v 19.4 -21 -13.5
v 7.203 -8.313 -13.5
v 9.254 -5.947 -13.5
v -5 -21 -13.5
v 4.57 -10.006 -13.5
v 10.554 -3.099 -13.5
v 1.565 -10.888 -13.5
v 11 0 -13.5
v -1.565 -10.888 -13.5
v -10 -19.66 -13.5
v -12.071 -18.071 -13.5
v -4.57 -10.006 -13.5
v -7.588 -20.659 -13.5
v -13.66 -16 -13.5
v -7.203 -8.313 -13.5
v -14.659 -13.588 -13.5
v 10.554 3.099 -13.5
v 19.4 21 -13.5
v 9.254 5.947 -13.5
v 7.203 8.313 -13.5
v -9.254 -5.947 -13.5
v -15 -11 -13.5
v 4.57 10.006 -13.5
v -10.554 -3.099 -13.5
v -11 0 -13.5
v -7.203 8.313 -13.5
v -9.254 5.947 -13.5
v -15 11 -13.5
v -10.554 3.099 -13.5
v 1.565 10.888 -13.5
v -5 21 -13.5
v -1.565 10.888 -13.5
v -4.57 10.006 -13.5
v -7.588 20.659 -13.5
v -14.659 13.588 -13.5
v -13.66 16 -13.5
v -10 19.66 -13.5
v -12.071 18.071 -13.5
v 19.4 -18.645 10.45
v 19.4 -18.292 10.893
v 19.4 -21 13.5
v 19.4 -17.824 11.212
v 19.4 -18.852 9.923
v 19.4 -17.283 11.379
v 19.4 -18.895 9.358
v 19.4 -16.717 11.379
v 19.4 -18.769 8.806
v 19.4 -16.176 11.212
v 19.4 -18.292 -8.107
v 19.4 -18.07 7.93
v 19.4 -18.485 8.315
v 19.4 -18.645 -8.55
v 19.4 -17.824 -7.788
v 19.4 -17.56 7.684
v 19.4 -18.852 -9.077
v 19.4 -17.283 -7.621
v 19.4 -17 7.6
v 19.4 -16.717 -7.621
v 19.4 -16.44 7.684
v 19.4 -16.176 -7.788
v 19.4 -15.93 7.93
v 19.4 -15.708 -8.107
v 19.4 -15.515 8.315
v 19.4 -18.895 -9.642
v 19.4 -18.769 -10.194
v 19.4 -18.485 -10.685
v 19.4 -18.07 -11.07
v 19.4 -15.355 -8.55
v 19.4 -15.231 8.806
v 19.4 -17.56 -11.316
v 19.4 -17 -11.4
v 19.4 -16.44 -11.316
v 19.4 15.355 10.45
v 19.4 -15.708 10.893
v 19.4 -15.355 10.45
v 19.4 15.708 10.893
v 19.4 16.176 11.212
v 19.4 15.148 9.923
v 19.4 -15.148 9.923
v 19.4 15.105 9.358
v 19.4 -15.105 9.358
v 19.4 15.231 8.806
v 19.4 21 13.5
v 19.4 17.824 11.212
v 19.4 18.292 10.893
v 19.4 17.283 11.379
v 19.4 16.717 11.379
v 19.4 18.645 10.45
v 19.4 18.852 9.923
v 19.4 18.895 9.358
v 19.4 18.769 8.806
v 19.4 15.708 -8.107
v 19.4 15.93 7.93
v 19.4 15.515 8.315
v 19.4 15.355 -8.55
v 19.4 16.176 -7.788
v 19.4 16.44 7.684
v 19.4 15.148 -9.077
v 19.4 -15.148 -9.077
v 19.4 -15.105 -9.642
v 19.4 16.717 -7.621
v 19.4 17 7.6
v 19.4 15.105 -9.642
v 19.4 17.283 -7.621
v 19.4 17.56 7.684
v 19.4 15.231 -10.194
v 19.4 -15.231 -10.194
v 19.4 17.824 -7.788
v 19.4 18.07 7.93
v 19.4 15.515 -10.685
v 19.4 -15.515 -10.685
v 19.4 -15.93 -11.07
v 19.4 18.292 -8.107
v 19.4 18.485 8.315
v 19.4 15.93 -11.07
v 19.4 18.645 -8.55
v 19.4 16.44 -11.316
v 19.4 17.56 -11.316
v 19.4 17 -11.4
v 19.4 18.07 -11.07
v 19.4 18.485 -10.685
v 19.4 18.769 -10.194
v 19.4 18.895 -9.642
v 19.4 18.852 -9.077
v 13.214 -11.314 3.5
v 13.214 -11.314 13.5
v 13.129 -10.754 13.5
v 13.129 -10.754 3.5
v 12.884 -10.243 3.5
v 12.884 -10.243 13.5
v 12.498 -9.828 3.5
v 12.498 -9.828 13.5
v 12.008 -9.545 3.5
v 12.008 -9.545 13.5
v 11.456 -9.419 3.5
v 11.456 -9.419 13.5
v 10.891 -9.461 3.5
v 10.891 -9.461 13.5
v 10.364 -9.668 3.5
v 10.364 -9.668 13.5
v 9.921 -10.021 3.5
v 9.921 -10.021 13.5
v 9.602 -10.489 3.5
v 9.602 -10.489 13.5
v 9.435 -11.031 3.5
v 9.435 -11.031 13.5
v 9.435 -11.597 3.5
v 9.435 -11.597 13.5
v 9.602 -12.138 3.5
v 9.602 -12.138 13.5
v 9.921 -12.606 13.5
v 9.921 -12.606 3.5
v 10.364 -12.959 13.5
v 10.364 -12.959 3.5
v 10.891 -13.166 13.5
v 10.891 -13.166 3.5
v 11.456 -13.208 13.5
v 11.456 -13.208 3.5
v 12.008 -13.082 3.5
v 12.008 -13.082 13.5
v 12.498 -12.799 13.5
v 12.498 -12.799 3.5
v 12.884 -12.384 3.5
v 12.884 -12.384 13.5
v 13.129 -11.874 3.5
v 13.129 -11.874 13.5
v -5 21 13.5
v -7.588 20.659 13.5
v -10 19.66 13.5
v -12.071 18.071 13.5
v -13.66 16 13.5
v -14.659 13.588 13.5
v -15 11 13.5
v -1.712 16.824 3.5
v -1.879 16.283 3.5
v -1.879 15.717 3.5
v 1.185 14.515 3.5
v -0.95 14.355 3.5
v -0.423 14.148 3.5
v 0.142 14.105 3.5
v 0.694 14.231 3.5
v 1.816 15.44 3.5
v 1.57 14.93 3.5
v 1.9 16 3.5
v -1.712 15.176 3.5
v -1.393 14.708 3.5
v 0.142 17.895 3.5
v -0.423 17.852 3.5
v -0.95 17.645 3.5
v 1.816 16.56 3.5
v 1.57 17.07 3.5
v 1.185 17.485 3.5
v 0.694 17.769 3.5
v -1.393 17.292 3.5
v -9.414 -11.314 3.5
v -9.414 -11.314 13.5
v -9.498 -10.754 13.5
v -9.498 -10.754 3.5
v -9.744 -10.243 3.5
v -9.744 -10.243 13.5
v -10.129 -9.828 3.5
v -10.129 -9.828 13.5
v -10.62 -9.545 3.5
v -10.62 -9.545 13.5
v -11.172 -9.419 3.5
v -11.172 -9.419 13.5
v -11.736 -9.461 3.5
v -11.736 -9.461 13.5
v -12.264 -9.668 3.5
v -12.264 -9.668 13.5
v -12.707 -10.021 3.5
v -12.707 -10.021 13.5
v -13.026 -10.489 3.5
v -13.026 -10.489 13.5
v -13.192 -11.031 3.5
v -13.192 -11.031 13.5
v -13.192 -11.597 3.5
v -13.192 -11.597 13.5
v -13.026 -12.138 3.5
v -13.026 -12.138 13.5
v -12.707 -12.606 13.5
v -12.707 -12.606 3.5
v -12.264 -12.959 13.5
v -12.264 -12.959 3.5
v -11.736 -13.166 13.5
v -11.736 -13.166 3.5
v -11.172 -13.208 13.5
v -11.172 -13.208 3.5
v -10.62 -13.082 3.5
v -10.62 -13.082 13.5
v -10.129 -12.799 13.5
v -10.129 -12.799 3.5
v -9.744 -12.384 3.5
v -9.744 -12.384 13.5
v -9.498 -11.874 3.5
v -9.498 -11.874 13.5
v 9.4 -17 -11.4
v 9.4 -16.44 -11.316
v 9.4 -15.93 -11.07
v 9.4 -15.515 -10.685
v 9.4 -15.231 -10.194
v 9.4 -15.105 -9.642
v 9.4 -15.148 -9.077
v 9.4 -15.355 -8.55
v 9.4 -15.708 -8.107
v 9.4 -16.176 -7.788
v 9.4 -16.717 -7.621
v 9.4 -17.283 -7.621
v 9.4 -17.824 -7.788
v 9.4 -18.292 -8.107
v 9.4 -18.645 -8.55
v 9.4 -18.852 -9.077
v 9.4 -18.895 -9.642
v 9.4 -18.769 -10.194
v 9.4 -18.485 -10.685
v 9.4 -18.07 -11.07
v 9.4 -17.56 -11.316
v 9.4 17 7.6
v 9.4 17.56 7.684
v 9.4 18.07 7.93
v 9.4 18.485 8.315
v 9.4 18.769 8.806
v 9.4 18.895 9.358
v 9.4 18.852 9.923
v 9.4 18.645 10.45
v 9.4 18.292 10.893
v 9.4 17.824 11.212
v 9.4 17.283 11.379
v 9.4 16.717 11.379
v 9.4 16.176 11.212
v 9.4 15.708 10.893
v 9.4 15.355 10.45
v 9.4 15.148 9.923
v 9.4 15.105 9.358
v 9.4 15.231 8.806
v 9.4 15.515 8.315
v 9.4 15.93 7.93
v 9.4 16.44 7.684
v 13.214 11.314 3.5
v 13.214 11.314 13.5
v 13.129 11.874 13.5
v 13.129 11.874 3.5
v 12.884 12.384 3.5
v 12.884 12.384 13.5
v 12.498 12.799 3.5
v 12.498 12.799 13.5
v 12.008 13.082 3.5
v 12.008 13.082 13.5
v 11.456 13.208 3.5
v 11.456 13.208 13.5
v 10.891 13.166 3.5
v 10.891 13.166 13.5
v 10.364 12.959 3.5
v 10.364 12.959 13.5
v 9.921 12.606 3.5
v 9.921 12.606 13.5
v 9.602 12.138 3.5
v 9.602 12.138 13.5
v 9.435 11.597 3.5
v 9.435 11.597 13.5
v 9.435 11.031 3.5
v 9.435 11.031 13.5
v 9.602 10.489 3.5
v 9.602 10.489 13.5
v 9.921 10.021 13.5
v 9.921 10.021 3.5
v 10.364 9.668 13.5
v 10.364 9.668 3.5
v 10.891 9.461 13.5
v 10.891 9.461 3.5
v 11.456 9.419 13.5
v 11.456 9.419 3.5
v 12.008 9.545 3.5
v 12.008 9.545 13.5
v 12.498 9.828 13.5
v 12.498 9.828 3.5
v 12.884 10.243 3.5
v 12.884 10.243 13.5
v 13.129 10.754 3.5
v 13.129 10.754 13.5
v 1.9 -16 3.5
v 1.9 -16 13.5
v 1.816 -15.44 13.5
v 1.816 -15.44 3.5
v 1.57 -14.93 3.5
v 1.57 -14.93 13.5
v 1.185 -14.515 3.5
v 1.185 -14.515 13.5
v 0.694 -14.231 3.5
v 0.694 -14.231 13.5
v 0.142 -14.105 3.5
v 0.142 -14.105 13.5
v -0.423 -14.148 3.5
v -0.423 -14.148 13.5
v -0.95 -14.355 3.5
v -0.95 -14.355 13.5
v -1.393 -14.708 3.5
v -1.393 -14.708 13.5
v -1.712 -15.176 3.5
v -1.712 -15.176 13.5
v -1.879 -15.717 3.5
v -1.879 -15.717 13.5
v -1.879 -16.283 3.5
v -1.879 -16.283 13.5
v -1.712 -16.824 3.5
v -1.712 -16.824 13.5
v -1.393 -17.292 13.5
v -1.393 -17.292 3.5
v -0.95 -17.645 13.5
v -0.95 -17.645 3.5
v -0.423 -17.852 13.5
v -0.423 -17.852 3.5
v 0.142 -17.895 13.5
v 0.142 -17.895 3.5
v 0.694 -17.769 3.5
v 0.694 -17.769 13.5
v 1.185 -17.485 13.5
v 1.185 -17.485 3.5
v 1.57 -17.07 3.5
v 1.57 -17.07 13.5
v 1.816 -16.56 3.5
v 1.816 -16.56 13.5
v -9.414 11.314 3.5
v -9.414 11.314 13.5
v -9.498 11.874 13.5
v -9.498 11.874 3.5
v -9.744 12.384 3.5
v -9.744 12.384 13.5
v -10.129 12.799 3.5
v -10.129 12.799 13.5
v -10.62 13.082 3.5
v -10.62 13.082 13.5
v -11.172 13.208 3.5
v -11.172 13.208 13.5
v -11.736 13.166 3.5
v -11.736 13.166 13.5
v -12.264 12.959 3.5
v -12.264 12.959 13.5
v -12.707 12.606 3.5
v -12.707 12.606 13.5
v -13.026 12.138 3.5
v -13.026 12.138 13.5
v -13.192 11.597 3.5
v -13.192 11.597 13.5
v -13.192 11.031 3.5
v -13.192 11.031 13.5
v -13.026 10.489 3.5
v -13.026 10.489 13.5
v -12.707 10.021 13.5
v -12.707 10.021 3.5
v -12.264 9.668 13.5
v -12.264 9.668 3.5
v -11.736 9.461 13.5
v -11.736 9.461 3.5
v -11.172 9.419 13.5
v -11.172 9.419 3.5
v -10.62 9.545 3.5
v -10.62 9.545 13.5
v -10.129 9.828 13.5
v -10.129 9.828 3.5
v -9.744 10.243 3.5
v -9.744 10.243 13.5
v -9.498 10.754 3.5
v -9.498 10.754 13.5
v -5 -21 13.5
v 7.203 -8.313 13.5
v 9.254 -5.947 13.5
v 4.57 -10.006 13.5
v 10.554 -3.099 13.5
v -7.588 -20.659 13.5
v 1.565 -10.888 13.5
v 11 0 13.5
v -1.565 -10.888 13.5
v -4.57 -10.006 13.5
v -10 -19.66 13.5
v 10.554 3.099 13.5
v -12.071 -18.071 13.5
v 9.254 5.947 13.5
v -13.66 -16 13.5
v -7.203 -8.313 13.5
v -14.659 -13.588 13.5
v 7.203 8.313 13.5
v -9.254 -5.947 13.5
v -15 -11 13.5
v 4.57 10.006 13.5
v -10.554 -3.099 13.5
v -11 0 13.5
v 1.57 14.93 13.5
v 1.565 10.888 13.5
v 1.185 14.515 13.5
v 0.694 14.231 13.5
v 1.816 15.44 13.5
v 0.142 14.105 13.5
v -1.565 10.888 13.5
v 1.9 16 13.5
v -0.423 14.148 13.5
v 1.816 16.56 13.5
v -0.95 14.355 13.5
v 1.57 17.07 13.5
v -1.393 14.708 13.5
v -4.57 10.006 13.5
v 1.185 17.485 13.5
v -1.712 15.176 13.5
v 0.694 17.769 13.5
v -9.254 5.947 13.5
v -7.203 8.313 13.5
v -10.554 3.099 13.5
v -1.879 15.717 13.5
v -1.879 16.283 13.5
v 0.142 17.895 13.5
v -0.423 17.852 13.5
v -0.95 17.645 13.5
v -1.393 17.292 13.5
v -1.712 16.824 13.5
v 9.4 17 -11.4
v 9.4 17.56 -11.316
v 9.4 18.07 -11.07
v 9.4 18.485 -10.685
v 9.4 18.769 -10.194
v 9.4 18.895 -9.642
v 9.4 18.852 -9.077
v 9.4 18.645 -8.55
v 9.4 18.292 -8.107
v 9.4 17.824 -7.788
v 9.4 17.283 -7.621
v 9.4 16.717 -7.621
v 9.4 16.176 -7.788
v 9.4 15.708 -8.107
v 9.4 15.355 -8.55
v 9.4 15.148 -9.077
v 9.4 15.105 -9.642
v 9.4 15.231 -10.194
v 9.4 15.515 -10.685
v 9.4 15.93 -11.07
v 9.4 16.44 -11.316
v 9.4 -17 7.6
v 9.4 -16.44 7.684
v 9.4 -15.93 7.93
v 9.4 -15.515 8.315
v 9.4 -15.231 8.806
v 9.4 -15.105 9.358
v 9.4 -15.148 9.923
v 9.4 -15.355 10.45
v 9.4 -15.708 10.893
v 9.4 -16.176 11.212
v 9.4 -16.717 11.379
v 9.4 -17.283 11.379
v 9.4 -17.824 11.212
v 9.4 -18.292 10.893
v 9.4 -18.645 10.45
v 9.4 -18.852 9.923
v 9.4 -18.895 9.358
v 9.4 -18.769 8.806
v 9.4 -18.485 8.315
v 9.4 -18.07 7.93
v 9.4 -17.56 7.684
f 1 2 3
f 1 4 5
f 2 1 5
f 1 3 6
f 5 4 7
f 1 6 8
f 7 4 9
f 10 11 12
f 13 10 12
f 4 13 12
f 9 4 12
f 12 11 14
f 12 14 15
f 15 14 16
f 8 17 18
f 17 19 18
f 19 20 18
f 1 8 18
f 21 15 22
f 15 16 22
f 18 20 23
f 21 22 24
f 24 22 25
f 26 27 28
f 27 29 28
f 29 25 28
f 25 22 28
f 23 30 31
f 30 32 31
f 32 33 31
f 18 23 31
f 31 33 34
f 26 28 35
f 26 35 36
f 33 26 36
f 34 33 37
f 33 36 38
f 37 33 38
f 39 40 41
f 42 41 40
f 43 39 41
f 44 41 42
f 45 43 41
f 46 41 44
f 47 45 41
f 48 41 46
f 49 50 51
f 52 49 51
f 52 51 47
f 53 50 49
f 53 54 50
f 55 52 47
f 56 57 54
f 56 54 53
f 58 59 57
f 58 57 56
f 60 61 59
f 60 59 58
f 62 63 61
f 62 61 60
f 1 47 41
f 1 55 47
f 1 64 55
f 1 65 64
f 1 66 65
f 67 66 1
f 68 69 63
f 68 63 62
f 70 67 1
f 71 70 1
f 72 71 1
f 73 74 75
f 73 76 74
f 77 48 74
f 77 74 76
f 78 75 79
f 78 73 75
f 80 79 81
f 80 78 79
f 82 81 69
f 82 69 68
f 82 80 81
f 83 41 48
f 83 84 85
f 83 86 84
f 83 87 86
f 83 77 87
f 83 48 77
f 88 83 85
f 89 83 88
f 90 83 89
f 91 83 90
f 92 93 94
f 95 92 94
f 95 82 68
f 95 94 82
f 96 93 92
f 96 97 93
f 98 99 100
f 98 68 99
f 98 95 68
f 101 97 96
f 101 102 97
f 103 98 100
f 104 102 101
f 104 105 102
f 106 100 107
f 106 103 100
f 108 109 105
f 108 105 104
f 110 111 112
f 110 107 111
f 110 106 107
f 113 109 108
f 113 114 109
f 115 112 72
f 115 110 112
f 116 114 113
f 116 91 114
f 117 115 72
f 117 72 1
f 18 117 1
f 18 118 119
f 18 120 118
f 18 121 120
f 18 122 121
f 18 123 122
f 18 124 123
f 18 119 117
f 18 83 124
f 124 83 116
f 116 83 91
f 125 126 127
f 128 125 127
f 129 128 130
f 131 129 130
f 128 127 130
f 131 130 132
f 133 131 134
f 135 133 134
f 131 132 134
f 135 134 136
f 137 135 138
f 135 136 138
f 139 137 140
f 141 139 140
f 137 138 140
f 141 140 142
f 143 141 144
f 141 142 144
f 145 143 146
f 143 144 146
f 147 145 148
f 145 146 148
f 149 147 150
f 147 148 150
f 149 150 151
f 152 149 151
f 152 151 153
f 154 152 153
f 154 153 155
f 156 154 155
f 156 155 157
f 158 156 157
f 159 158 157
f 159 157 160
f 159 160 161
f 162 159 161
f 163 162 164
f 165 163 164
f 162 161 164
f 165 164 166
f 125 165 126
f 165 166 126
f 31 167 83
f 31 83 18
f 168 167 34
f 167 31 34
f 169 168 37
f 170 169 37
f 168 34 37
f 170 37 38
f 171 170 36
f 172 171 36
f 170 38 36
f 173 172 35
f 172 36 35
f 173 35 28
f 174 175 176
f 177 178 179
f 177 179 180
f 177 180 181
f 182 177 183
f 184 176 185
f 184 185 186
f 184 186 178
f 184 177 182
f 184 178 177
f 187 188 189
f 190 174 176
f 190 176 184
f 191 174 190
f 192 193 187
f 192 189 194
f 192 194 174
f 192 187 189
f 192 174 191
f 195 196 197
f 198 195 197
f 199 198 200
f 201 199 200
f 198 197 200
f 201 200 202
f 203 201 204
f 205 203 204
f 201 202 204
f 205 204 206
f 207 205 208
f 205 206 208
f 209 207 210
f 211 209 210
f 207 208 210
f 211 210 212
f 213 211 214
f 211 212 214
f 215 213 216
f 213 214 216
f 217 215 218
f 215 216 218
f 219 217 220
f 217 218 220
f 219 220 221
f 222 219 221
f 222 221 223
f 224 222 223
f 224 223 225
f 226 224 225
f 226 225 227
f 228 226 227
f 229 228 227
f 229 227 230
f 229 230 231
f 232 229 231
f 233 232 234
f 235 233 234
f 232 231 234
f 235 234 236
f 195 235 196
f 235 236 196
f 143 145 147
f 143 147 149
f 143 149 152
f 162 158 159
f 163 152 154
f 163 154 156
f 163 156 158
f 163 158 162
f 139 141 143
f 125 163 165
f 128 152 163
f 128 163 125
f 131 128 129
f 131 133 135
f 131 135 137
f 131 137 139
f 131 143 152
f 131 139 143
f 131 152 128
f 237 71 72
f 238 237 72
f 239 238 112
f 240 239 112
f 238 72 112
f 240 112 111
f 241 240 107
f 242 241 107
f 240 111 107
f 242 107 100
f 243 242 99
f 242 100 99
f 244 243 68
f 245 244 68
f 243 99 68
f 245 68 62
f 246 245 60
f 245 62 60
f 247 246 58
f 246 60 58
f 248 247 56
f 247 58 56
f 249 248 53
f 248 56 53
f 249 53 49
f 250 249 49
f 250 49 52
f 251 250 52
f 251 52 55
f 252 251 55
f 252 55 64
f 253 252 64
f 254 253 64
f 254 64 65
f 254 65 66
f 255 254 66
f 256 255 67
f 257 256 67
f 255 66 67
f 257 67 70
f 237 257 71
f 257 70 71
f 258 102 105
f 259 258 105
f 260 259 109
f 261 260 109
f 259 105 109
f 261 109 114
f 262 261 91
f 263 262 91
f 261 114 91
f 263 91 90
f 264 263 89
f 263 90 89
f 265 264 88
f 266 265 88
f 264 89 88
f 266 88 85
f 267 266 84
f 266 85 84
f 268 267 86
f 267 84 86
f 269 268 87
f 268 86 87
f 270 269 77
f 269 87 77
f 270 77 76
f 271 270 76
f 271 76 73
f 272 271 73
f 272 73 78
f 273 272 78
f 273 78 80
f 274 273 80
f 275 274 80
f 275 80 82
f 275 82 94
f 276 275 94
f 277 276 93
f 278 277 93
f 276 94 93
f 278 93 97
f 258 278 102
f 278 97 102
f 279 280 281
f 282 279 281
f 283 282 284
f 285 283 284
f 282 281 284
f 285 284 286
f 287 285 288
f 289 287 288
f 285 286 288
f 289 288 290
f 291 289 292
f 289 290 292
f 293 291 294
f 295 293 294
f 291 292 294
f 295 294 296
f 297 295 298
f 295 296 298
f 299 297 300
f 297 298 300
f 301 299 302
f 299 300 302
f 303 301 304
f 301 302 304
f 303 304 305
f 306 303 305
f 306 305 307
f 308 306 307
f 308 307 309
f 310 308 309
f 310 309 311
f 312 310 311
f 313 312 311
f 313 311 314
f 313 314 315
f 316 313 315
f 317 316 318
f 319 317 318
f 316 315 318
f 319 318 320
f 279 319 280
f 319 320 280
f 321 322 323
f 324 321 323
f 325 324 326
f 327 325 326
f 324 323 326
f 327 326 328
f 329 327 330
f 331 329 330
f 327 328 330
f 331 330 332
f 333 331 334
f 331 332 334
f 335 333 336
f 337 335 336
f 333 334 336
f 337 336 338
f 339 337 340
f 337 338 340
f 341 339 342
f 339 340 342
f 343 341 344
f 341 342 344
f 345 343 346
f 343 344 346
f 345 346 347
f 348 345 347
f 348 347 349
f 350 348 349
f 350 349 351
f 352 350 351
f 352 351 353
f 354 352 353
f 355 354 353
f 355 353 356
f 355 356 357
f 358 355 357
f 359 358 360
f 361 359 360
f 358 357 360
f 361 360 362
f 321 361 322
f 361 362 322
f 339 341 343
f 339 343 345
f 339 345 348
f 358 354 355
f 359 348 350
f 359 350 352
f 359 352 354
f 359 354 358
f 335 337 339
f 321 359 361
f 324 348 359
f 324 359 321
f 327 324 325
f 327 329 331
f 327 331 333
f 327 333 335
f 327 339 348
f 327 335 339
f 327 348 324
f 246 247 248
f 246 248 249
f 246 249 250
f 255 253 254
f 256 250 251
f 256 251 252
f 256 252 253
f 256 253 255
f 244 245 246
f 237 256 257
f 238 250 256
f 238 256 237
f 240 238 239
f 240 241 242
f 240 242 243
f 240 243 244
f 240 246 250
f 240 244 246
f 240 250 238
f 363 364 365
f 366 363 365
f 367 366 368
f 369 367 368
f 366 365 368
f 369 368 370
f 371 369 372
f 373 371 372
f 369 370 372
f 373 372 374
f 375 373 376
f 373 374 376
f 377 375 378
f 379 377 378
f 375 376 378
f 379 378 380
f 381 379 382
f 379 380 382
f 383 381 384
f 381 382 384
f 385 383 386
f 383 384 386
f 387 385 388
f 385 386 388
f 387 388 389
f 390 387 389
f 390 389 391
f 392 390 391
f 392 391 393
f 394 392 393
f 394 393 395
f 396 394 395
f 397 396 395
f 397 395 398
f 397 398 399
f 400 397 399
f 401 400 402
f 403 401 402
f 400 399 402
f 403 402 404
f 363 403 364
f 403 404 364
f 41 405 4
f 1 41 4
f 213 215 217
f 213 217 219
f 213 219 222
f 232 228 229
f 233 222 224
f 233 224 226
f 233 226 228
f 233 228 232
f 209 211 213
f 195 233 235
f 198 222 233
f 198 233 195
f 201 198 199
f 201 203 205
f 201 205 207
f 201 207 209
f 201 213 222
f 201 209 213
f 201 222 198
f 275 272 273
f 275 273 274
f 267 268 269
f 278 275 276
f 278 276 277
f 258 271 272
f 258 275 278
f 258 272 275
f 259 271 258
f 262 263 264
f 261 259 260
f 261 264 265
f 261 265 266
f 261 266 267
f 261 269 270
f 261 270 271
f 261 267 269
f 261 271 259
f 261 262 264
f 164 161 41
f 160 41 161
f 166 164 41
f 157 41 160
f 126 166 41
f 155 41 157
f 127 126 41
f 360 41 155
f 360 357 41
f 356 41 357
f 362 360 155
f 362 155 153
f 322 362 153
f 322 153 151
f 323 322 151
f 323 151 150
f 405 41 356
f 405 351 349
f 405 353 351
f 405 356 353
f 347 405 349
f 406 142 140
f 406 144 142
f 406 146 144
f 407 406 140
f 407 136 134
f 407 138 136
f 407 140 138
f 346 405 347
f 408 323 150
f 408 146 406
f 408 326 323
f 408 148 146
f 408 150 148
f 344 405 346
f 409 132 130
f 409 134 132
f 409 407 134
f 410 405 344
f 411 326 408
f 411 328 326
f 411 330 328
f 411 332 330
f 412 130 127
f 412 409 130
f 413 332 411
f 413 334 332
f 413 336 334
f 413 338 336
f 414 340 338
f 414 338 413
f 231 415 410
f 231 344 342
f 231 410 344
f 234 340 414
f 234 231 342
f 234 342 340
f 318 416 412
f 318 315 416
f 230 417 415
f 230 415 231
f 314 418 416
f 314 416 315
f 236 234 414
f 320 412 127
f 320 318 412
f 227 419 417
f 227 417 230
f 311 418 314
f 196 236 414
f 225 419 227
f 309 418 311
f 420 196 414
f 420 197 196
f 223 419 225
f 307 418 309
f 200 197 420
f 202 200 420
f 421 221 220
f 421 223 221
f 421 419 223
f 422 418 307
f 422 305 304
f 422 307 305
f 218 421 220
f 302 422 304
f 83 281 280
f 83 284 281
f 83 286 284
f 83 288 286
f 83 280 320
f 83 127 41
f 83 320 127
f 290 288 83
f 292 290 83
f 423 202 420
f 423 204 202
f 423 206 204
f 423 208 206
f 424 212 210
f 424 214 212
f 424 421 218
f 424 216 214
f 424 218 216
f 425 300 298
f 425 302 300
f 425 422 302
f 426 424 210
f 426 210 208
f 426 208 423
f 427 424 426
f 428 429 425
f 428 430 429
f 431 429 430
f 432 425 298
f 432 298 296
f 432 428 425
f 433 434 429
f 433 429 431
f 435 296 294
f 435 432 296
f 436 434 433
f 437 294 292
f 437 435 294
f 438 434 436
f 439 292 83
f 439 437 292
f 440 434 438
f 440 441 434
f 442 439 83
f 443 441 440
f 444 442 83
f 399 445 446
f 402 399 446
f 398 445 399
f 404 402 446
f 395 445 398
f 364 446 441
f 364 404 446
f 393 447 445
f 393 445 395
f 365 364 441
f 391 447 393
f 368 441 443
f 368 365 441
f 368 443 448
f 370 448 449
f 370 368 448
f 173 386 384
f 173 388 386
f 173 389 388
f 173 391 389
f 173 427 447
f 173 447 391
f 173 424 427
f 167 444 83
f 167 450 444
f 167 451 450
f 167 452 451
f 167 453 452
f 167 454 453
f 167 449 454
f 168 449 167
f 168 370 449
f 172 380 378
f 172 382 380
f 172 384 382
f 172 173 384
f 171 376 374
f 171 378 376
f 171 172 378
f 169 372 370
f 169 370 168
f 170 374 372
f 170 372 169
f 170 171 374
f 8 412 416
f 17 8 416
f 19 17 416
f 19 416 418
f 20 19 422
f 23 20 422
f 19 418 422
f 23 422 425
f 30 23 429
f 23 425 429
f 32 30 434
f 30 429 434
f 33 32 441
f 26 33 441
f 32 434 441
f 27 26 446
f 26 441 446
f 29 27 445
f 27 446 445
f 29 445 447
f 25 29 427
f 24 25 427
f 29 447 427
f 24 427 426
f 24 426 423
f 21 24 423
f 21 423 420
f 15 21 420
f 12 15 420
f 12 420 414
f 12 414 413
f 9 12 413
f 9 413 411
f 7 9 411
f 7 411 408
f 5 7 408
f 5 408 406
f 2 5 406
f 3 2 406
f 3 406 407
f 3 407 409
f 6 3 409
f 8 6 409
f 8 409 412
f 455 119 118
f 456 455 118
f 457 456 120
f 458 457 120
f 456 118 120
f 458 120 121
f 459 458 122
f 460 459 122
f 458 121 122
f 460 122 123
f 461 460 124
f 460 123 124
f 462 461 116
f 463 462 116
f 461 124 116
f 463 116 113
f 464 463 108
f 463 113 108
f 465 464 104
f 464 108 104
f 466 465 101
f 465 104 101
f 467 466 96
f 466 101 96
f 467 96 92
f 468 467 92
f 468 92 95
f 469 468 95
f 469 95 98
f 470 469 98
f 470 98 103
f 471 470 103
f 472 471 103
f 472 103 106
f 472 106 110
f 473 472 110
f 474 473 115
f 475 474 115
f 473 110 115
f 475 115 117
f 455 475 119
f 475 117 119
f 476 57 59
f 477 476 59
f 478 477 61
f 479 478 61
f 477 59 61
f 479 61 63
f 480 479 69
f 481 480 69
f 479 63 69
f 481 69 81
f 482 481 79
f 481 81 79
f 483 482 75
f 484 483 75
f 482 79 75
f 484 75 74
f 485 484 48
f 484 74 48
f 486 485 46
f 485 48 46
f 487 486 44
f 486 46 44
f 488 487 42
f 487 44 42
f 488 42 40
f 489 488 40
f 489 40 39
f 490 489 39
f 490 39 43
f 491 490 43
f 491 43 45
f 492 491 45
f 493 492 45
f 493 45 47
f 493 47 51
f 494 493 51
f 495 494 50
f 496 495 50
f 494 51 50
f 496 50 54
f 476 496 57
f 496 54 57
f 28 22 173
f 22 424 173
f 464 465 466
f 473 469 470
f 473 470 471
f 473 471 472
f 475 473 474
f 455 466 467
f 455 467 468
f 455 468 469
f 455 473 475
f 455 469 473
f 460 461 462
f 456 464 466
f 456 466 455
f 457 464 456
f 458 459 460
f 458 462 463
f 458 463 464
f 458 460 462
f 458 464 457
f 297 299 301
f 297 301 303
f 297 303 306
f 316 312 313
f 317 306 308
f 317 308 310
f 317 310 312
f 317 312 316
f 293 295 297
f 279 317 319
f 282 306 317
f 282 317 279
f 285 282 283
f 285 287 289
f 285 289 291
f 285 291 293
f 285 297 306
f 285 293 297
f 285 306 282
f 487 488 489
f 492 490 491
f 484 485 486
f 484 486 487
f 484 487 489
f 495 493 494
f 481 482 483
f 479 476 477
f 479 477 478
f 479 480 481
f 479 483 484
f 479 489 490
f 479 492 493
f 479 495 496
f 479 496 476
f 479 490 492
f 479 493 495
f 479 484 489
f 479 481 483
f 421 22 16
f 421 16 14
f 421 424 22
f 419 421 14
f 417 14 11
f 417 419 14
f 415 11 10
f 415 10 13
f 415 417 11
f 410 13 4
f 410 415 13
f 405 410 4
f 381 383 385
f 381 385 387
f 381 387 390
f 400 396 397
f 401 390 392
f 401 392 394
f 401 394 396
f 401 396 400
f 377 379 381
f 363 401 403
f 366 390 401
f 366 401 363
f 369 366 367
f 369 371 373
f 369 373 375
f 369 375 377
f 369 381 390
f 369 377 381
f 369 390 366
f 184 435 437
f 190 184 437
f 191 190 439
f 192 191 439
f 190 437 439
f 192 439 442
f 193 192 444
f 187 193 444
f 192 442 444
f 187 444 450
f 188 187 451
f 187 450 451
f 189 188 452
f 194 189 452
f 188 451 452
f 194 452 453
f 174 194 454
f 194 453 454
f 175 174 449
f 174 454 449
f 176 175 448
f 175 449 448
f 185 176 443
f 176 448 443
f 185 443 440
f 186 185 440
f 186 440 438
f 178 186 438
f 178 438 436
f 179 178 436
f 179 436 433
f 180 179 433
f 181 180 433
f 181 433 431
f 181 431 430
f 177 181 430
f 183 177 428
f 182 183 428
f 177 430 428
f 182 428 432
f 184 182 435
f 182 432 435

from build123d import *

# Parameters (mm, degrees)
SKETCH1_W           = 30
SKETCH1_H           = 42
BOSS_EXTRUDE1_DEPTH = 13.5
SKETCH2_R           = 11
CUT_EXTRUDE1_DEPTH  = 38.349698794
SKETCH3_R           = 1.9
CUT_EXTRUDE2_DEPTH  = 10
SKETCH7_W           = 27
SKETCH7_H           = 42
BOSS_EXTRUDE2_DEPTH = 4.4
SKETCH6_R           = 1.9
CUT_EXTRUDE3_DEPTH  = 10
FILLET1_R           = 10


with BuildPart() as part:
    # Sketch1 → Boss-Extrude1 (new, symmetric)
    with BuildSketch(Plane.XY):
        Rectangle(SKETCH1_W, SKETCH1_H)
    extrude(amount=BOSS_EXTRUDE1_DEPTH, both=True)

    # Sketch2 → Cut-Extrude1 (cut, through all)
    with BuildSketch(Plane.XY.offset(13.5)):
        Circle(SKETCH2_R)
    extrude(amount=-CUT_EXTRUDE1_DEPTH, mode=Mode.SUBTRACT)

    # Sketch3 → Cut-Extrude2 (cut)
    with BuildSketch(Plane.XY.offset(13.5)):
        with Locations((-11.313708499, 11.313708499)):
            Circle(SKETCH3_R)
        with Locations((0, 16)):
            Circle(SKETCH3_R)
        with Locations((11.313708499, 11.313708499)):
            Circle(SKETCH3_R)
        with Locations((11.313708499, -11.313708499)):
            Circle(SKETCH3_R)
        with Locations((0, -16)):
            Circle(SKETCH3_R)
        with Locations((-11.313708499, -11.313708499)):
            Circle(SKETCH3_R)
    extrude(amount=-CUT_EXTRUDE2_DEPTH, mode=Mode.SUBTRACT)

    # Sketch7 → Boss-Extrude2 (add)
    with BuildSketch(Plane(origin=(15, 0, 0), x_dir=(0, 0, -1), z_dir=(1, 0, 0))):
        Rectangle(SKETCH7_W, SKETCH7_H)
    extrude(amount=BOSS_EXTRUDE2_DEPTH)

    # Sketch6 → Cut-Extrude3 (cut)
    with BuildSketch(Plane(origin=(19.4, 0, 0), x_dir=(0, 0, -1), z_dir=(1, 0, 0))):
        with Locations((9.5, 17)):
            Circle(SKETCH6_R)
        with Locations((-9.5, 17)):
            Circle(SKETCH6_R)
        with Locations((9.5, -17)):
            Circle(SKETCH6_R)
        with Locations((-9.5, -17)):
            Circle(SKETCH6_R)
    extrude(amount=-CUT_EXTRUDE3_DEPTH, mode=Mode.SUBTRACT)

    # Fillet1
    fillet1_edges = [part.edges().sort_by_distance(p)[0] for p in [
        (-15, -21, 0),
        (-15, 21, 0),
    ]]
    fillet(fillet1_edges, radius=FILLET1_R)


solid = part.part
